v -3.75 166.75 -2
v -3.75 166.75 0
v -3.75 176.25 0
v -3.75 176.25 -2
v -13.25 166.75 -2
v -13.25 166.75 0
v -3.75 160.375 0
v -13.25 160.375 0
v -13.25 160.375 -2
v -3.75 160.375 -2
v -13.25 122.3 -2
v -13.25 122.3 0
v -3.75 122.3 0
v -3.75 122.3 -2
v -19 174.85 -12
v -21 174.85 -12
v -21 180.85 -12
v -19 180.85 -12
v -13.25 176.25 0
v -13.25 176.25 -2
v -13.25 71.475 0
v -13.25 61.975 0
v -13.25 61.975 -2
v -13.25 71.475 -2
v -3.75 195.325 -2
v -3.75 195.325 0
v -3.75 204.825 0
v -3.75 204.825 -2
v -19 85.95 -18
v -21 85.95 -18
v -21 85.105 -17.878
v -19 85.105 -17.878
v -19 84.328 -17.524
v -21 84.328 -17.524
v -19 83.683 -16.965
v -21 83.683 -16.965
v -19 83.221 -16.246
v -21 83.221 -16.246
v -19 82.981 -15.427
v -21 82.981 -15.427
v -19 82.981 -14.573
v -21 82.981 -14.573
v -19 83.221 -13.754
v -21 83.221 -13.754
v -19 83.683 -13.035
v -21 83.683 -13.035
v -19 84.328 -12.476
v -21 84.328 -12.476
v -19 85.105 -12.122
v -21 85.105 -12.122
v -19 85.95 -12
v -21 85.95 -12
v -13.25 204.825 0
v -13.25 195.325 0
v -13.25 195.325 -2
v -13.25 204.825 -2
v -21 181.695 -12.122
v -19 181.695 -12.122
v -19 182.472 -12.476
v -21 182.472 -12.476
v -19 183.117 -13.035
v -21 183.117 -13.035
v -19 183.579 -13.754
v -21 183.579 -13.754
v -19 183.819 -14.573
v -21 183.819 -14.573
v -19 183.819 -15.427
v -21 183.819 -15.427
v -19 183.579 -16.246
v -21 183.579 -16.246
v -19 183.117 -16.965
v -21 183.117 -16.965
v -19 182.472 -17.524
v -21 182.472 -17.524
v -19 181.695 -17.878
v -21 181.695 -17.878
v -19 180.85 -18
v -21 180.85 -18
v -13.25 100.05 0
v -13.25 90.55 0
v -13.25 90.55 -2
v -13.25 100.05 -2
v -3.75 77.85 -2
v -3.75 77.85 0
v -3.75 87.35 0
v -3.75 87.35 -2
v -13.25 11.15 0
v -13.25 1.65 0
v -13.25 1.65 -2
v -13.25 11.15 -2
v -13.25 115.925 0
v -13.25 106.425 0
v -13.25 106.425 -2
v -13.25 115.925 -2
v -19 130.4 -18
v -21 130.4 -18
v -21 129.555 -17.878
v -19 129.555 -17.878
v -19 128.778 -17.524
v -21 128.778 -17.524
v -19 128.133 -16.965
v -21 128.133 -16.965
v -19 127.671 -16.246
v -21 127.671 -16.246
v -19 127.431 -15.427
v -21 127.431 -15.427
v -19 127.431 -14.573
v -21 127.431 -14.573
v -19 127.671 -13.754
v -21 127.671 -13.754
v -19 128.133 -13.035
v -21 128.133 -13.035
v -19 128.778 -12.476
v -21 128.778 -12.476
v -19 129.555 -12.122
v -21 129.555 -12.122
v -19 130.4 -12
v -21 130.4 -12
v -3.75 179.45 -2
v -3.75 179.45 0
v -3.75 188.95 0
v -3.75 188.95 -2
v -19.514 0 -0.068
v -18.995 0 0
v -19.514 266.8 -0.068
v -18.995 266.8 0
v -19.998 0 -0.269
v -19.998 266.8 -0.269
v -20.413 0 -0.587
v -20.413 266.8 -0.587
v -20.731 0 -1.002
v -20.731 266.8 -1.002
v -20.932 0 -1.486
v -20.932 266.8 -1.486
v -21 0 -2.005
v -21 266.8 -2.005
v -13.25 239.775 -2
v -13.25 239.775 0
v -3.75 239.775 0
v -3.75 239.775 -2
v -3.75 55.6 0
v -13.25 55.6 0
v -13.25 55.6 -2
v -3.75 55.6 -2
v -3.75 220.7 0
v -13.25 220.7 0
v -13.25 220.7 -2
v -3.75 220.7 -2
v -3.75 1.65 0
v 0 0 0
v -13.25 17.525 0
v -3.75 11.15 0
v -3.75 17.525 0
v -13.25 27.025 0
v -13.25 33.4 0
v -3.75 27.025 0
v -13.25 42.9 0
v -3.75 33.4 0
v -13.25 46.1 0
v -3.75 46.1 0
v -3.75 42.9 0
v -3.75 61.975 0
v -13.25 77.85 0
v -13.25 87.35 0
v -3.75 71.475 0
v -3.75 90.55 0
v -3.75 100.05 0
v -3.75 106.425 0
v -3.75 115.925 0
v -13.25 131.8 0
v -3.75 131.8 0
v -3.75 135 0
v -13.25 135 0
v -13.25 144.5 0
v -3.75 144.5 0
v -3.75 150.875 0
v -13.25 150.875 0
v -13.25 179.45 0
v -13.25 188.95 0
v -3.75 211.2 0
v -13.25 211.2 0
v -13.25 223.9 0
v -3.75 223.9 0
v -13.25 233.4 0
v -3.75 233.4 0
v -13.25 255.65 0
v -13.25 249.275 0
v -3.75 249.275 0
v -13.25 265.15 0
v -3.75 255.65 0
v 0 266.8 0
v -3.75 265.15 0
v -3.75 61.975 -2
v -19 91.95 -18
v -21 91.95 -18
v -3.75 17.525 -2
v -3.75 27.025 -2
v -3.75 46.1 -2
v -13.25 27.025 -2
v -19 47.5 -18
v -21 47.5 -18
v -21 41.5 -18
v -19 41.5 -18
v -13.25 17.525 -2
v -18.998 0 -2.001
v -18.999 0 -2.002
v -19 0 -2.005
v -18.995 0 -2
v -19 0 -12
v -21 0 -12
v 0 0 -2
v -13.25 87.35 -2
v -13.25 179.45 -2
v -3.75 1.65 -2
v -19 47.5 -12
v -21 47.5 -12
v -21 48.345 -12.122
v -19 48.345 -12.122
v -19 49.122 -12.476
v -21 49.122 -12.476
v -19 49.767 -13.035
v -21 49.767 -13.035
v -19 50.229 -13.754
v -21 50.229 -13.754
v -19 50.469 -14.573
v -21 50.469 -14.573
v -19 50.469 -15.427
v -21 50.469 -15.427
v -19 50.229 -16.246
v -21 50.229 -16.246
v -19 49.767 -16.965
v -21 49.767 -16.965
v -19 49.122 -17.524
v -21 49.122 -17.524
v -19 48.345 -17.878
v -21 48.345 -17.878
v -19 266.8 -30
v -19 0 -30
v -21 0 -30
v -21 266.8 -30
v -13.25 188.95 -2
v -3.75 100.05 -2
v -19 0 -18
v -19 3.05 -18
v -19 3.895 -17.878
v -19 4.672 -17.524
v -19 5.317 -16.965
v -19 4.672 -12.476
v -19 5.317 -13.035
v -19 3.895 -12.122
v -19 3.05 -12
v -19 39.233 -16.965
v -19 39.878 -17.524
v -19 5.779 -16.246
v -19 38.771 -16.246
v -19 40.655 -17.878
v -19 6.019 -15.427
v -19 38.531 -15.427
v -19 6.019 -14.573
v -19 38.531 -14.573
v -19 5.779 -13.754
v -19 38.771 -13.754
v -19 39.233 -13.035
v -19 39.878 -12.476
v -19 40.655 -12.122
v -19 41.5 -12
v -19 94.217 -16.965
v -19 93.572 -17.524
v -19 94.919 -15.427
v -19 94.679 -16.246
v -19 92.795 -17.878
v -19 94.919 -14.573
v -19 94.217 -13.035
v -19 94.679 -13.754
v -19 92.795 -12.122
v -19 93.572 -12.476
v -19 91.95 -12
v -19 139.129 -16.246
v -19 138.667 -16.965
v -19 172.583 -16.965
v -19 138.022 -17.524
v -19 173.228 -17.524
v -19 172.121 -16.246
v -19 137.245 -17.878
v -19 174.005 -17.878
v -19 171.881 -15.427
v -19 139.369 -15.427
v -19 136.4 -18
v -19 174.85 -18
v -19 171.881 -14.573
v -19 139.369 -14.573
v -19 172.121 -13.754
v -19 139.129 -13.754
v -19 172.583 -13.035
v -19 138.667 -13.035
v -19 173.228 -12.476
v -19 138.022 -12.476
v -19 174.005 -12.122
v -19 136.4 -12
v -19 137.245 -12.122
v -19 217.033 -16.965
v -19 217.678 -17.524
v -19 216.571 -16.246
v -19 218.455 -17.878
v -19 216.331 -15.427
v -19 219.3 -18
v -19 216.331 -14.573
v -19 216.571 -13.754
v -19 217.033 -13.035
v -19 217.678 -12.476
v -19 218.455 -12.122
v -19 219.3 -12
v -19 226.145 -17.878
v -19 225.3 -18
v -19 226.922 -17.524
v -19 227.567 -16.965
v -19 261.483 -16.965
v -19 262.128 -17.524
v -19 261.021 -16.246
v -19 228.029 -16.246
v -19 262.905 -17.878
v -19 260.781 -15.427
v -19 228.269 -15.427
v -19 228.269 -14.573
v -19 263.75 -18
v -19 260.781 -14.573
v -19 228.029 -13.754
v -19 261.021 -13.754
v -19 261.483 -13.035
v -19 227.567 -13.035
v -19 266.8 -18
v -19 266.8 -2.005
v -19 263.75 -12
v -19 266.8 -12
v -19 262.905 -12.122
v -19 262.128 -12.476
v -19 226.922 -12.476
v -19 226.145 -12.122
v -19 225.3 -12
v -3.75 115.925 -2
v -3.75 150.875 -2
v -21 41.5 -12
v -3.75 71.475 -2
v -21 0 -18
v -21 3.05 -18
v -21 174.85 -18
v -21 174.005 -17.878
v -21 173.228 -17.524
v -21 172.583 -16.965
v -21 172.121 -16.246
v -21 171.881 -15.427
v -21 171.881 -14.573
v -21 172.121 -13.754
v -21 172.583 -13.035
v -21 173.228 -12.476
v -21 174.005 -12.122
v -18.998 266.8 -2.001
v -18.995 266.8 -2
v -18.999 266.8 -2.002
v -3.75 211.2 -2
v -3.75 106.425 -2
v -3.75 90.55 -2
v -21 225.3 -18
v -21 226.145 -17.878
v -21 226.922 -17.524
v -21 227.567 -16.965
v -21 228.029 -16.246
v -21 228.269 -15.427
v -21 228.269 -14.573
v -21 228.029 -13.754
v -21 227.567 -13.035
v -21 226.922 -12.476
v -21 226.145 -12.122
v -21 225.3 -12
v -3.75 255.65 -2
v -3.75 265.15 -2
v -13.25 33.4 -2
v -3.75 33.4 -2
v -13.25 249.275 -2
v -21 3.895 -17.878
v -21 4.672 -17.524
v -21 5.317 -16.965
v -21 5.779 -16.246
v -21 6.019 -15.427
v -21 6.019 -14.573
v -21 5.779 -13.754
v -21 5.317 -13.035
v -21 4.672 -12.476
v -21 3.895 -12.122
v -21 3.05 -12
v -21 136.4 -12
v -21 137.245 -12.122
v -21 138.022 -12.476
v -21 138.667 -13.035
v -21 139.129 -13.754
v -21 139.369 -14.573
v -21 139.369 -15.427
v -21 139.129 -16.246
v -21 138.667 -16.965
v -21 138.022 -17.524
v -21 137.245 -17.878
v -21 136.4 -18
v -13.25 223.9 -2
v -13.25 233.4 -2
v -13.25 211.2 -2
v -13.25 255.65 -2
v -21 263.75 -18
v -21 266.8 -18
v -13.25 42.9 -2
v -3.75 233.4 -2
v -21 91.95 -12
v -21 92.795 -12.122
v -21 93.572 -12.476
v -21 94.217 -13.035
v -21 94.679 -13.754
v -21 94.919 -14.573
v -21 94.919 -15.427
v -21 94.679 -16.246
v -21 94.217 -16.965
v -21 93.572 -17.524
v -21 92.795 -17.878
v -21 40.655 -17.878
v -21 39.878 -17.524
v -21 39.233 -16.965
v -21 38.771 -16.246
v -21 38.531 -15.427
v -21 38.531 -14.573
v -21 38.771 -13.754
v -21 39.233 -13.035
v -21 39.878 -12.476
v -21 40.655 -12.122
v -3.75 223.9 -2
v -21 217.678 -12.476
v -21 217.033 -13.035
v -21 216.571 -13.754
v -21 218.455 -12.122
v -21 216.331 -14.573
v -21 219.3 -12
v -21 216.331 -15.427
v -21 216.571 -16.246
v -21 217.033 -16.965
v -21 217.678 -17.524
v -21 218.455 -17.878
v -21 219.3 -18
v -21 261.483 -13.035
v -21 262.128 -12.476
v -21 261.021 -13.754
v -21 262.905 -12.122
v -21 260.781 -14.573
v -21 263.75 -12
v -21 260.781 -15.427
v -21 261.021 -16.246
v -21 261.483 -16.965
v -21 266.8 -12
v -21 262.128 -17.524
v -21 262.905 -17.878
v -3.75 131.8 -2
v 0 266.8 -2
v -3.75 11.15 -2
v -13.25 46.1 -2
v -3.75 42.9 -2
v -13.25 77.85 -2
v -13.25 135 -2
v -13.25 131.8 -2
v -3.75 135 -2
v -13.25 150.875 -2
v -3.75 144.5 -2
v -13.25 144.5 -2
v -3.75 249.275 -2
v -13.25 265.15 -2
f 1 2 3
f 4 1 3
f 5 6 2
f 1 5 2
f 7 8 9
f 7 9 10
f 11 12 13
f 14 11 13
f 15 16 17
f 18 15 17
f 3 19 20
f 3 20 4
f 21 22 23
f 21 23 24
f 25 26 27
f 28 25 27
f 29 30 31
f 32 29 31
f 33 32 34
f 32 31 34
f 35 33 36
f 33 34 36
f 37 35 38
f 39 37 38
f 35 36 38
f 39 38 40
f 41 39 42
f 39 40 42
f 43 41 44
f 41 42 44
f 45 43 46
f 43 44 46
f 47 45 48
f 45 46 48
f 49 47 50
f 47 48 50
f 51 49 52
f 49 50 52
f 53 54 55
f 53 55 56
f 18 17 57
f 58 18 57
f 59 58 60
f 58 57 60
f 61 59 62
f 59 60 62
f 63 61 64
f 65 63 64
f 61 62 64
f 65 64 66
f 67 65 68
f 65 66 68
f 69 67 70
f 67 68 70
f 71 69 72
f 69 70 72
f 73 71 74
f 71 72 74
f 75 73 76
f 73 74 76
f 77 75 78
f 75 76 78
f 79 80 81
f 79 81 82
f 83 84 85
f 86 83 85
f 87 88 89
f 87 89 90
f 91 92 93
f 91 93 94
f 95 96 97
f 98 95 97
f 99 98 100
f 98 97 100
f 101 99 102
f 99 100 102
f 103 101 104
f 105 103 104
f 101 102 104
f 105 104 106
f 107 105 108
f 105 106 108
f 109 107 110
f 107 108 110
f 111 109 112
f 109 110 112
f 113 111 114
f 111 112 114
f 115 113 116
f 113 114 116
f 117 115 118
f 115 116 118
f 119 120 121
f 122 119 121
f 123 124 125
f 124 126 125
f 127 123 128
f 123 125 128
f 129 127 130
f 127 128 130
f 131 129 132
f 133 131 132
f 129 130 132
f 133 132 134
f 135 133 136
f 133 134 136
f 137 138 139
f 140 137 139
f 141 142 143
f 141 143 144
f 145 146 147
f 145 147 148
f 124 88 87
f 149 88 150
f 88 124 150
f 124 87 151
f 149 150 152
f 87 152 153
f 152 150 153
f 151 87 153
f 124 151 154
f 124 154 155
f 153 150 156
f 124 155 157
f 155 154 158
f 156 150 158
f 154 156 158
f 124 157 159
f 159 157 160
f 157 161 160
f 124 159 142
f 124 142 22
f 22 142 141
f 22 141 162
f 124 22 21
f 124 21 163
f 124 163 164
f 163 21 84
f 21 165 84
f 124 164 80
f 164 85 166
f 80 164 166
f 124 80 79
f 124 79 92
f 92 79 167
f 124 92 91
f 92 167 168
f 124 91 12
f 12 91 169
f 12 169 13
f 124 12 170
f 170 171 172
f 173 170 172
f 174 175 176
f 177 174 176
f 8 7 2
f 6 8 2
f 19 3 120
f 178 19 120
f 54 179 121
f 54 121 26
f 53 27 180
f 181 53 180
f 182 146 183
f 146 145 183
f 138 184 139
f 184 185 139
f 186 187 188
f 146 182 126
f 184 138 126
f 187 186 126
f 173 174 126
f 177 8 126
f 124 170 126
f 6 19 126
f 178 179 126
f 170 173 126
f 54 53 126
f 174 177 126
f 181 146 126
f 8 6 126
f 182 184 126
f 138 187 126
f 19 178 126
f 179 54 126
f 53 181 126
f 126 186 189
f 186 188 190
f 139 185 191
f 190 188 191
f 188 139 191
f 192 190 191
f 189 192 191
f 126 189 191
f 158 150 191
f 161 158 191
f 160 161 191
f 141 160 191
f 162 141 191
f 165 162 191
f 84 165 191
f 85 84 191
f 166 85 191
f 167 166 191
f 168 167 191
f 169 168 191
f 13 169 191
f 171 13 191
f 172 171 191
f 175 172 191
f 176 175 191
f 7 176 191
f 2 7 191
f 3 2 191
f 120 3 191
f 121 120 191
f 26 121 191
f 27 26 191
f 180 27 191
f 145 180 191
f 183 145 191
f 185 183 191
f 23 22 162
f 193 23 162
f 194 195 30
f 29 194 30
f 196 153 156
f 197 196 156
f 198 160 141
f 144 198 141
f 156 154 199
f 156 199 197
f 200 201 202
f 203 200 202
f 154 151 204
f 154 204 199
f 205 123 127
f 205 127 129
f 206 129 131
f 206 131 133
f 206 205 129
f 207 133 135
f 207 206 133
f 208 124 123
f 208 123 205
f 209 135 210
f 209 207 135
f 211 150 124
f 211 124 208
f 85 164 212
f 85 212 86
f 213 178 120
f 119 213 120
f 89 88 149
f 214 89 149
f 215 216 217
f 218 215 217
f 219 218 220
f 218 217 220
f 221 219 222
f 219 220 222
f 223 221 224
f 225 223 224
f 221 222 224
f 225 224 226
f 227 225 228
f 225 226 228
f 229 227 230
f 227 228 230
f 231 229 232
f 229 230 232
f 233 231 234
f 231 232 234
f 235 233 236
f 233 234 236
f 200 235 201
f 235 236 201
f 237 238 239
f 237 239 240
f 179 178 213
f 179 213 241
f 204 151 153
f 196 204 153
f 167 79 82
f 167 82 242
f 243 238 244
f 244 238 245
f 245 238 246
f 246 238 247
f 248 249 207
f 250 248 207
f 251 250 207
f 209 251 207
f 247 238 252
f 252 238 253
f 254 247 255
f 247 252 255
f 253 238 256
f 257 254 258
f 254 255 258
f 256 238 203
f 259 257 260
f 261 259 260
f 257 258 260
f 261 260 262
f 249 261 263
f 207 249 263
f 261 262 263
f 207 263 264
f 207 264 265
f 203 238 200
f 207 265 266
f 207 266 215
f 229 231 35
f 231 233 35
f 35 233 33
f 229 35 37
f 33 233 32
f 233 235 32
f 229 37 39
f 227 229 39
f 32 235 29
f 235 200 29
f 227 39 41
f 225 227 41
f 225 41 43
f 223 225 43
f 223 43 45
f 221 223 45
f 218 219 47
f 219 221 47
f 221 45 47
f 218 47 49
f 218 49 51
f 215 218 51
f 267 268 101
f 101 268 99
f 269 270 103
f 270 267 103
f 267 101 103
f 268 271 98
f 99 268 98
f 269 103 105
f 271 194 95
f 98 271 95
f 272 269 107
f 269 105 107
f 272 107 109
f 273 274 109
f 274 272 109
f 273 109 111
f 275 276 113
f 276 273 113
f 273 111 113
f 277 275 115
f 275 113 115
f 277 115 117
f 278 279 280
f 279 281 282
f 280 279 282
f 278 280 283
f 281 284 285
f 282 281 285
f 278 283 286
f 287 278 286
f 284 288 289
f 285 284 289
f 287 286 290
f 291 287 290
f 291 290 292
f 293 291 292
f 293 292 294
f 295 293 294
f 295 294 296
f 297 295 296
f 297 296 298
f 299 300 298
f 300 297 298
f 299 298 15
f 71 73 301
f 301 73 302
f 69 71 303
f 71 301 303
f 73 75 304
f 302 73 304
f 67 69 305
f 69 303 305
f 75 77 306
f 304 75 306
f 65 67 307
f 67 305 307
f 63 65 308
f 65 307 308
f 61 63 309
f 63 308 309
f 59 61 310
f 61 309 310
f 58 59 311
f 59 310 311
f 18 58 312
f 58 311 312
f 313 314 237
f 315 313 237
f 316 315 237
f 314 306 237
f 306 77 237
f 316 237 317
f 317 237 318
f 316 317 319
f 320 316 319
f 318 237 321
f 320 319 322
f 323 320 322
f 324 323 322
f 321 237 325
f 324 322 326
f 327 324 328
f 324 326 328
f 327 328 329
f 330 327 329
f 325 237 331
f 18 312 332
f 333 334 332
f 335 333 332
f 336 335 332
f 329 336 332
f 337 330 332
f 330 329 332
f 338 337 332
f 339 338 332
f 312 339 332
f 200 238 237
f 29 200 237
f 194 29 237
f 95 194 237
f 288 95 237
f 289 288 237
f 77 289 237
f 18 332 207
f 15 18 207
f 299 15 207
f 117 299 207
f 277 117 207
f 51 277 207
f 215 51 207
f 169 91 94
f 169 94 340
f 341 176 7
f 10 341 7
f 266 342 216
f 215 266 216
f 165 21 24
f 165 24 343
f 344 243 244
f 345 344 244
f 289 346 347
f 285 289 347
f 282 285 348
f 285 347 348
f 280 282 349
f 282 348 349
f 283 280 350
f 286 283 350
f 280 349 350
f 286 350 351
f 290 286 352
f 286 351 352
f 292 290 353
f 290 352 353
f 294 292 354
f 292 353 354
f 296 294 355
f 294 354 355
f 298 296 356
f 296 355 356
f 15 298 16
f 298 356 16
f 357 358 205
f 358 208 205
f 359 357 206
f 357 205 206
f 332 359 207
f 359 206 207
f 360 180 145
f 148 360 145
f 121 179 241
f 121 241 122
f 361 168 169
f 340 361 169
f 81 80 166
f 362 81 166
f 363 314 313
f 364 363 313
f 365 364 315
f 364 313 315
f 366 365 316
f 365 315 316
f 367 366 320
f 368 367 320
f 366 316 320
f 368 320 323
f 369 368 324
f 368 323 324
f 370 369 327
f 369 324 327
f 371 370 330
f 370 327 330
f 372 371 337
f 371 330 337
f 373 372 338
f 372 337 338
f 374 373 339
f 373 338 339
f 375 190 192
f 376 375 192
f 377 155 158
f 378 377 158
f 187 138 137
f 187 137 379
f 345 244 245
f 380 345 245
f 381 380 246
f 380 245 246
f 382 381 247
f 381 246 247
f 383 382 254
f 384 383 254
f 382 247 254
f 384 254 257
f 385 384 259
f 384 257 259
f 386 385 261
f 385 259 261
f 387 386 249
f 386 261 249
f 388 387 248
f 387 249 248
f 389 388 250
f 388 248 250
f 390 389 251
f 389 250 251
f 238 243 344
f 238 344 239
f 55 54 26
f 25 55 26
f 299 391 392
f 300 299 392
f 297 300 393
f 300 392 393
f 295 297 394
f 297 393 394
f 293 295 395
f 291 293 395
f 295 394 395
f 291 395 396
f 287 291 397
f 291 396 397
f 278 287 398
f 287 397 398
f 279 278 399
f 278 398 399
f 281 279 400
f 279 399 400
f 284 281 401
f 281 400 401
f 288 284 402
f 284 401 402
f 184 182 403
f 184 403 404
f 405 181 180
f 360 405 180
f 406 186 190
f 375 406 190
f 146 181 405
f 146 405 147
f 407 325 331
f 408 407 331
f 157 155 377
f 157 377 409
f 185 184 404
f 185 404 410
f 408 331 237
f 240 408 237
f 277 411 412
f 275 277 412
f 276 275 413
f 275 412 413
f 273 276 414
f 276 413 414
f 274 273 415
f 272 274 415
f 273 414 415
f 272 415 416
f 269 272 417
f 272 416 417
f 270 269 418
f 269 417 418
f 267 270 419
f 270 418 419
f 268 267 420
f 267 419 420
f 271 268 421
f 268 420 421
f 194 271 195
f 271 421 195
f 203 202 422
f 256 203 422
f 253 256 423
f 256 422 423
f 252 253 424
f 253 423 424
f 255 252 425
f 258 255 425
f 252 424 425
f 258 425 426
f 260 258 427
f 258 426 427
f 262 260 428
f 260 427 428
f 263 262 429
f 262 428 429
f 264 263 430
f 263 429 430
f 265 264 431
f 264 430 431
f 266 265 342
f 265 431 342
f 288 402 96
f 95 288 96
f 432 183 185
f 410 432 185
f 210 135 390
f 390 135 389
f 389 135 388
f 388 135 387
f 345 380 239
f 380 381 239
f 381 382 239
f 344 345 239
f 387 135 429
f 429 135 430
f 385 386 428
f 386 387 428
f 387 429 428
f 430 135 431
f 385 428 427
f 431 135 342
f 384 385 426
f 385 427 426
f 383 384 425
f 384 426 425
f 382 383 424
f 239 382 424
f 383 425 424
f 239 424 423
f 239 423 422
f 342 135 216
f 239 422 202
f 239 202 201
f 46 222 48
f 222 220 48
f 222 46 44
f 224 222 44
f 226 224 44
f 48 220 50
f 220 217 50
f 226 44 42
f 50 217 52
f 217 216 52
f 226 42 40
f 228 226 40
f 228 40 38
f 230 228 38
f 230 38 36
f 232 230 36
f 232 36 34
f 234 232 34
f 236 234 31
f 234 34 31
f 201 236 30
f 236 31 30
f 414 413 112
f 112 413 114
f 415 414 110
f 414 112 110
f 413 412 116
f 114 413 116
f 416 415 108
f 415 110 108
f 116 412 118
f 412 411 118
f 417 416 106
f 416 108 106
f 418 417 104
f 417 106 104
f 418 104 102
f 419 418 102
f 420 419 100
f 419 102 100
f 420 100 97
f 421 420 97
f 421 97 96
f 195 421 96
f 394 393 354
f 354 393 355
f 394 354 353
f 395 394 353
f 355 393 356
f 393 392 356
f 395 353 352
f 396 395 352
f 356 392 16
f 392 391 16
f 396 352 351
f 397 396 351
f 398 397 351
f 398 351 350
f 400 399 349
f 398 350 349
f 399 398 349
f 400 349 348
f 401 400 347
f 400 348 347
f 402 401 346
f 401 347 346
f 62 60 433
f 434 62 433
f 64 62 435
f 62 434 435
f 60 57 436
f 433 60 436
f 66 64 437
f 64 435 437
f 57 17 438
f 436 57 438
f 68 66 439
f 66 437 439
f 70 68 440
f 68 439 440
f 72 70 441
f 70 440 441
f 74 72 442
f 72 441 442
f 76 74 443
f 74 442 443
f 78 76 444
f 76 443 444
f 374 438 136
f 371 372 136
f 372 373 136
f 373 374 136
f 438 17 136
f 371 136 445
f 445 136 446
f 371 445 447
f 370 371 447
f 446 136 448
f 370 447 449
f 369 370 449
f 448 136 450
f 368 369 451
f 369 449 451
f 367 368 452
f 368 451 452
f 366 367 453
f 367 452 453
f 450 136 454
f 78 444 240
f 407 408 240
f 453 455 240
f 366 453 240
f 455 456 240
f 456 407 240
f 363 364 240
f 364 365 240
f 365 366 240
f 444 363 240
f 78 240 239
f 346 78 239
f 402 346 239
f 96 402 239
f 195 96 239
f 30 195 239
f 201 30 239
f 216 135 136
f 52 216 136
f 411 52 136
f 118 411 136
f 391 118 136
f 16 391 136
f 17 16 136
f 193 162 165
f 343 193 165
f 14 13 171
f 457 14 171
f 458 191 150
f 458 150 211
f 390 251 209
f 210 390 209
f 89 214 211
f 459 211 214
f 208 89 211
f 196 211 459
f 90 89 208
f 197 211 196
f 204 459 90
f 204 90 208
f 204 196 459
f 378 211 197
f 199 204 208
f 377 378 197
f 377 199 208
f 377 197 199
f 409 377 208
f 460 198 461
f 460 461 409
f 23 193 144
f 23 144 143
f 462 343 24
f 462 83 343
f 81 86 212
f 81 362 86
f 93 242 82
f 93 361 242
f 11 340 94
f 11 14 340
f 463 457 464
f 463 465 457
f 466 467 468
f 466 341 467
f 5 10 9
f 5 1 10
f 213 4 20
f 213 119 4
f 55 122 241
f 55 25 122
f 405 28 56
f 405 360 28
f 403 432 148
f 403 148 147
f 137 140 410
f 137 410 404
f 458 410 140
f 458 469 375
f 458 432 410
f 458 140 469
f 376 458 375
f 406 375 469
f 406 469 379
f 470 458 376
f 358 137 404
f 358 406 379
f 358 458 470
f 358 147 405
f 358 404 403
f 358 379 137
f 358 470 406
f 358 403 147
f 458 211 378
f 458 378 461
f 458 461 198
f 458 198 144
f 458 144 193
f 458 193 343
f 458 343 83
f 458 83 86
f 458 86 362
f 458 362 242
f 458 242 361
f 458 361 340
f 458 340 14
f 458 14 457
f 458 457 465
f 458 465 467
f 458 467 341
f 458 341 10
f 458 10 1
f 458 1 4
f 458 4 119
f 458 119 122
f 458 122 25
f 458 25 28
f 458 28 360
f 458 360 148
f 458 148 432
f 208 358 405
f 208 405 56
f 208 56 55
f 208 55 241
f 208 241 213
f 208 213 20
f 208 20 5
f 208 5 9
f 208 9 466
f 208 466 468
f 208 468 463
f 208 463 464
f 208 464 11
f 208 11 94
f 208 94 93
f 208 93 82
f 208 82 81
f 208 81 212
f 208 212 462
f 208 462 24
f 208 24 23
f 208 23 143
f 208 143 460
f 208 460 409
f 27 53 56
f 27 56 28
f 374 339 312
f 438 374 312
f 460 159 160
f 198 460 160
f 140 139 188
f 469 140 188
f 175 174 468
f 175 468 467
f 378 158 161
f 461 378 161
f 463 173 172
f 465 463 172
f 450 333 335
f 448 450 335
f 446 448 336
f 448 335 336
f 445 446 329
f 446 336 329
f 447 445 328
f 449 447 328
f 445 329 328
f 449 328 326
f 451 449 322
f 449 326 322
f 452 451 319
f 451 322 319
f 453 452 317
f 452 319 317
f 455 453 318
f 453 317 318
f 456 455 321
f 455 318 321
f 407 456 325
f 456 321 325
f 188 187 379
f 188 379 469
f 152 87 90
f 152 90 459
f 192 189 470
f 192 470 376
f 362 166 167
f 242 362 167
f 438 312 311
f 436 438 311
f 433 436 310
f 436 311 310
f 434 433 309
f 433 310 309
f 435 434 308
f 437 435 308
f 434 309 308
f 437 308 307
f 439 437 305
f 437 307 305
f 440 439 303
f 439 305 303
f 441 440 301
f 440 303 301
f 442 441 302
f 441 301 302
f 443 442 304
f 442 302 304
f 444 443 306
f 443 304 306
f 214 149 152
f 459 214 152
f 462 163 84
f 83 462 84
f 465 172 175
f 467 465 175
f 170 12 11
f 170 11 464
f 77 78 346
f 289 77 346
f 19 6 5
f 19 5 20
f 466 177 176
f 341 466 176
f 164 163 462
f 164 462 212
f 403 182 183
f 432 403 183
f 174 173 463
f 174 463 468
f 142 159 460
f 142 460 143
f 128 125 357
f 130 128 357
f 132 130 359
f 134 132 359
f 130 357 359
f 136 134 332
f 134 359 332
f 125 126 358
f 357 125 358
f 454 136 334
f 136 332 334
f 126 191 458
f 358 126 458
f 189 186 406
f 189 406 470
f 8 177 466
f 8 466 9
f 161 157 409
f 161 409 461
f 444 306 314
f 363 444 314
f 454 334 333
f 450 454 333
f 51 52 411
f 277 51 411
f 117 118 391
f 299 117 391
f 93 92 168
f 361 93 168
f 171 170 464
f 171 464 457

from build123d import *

# Parameters (mm, degrees)
SKETCH1_W           = 30
SKETCH1_H           = 266.8
BOSS_EXTRUDE1_DEPTH = 21
SKETCH2_W           = 19
SKETCH2_H           = 28
CUT_EXTRUDE1_DEPTH  = 270.301392495
CUT_EXTRUDE2_DEPTH  = 270.152819045
CUT_EXTRUDE3_DEPTH  = 270.152819045
CUT_EXTRUDE4_DEPTH  = 270.301392495
CUT_EXTRUDE5_DEPTH  = 270.301392495
CUT_EXTRUDE6_DEPTH  = 270.301392495
CUT_EXTRUDE7_DEPTH  = 270.301392495
SKETCH9_W           = 9.5
SKETCH9_H           = 9.5
CUT_EXTRUDE8_DEPTH  = 270.301392495
SKETCH10_W          = 9.5
SKETCH10_H          = 9.5
CUT_EXTRUDE9_DEPTH  = 270.301392495
SKETCH11_W          = 9.5
SKETCH11_H          = 9.5
CUT_EXTRUDE10_DEPTH = 270.301392495
SKETCH12_W          = 9.5
SKETCH12_H          = 9.5
CUT_EXTRUDE11_DEPTH = 270.301392495
SKETCH13_W          = 9.5
SKETCH13_H          = 9.5
CUT_EXTRUDE12_DEPTH = 270.301392495
SKETCH14_W          = 9.5
SKETCH14_H          = 9.5
CUT_EXTRUDE13_DEPTH = 270.301392495
SKETCH15_W          = 9.5
SKETCH15_H          = 9.5
CUT_EXTRUDE14_DEPTH = 270.301392495
SKETCH16_W          = 9.5
SKETCH16_H          = 9.5
CUT_EXTRUDE15_DEPTH = 270.301392495
SKETCH17_W          = 9.5
SKETCH17_H          = 9.5
CUT_EXTRUDE16_DEPTH = 270.301392495
SKETCH18_W          = 9.5
SKETCH18_H          = 9.5
CUT_EXTRUDE17_DEPTH = 270.301392495
SKETCH19_W          = 9.5
SKETCH19_H          = 9.5
CUT_EXTRUDE18_DEPTH = 270.301392495
SKETCH20_W          = 9.5
SKETCH20_H          = 9.5
CUT_EXTRUDE19_DEPTH = 270.301392495
SKETCH21_W          = 9.5
SKETCH21_H          = 9.5
CUT_EXTRUDE20_DEPTH = 270.301392495
SKETCH22_W          = 9.5
SKETCH22_H          = 9.5
CUT_EXTRUDE21_DEPTH = 270.301392495
SKETCH23_W          = 9.5
SKETCH23_H          = 9.5
CUT_EXTRUDE22_DEPTH = 270.301392495
SKETCH24_W          = 9.5
SKETCH24_H          = 9.5
CUT_EXTRUDE23_DEPTH = 270.301392495
SKETCH25_W          = 9.5
SKETCH25_H          = 9.5
CUT_EXTRUDE24_DEPTH = 270.301392495
SKETCH26_W          = 9.5
SKETCH26_H          = 9.5
CUT_EXTRUDE25_DEPTH = 270.301392495
CUT_EXTRUDE26_DEPTH = 270.152819045
FILLET1_R           = 0.005
FILLET2_R           = 2.005


with BuildPart() as part:
    # Sketch1 → Boss-Extrude1 (new body)
    with BuildSketch(Plane(origin=(0, 0, 0), x_dir=(0, 0, -1), z_dir=(1, 0, 0))):
        with Locations((15, 133.4)):
            Rectangle(SKETCH1_W, SKETCH1_H)
    extrude(amount=-BOSS_EXTRUDE1_DEPTH)

    # Sketch2 → Cut-Extrude1 (cut, through all)
    with BuildSketch(Plane(origin=(0, 266.8, 0), x_dir=(-1, 0, 0), z_dir=(0, 1, 0))):
        with Locations((9.5, -16)):
            Rectangle(SKETCH2_W, SKETCH2_H)
    extrude(amount=-CUT_EXTRUDE1_DEPTH, mode=Mode.SUBTRACT)

    # Sketch3 → Cut-Extrude2 (cut, through all)
    with BuildSketch(Plane(origin=(-19, 0, 0), x_dir=(0, 0, -1), z_dir=(1, 0, 0))):
        with BuildLine():
            Line((12, 266.8), (12, 263.75))
            ThreePointArc((12, 263.75), (15, 260.75), (18, 263.75))
            Line((18, 263.75), (18, 266.8))
            Line((18, 266.8), (12, 266.8))
        make_face()
    extrude(amount=-CUT_EXTRUDE2_DEPTH, mode=Mode.SUBTRACT)

    # Sketch4 → Cut-Extrude3 (cut, through all)
    with BuildSketch(Plane(origin=(-19, 0, 0), x_dir=(0, 0, -1), z_dir=(1, 0, 0))):
        with BuildLine():
            Line((18, 0), (18, 3.05))
            ThreePointArc((18, 3.05), (15, 6.05), (12, 3.05))
            Line((12, 3.05), (12, 0))
            Line((12, 0), (18, 0))
        make_face()
    extrude(amount=-CUT_EXTRUDE3_DEPTH, mode=Mode.SUBTRACT)

    # Sketch5 → Cut-Extrude4 (cut, through all)
    with BuildSketch(Plane.ZY.offset(21)):
        with BuildLine():
            Line((-12, 41.5), (-12, 47.5))
            ThreePointArc((-12, 47.5), (-15, 50.5), (-18, 47.5))
            Line((-18, 47.5), (-18, 41.5))
            ThreePointArc((-18, 41.5), (-15, 38.5), (-12, 41.5))
        make_face()
    extrude(amount=-CUT_EXTRUDE4_DEPTH, mode=Mode.SUBTRACT)

    # Sketch6 → Cut-Extrude5 (cut, through all)
    with BuildSketch(Plane.ZY.offset(21)):
        with BuildLine():
            Line((-12, 85.95), (-12, 91.95))
            ThreePointArc((-12, 91.95), (-15, 94.95), (-18, 91.95))
            Line((-18, 91.95), (-18, 85.95))
            ThreePointArc((-18, 85.95), (-15, 82.95), (-12, 85.95))
        make_face()
    extrude(amount=-CUT_EXTRUDE5_DEPTH, mode=Mode.SUBTRACT)

    # Sketch7 → Cut-Extrude6 (cut, through all)
    with BuildSketch(Plane.ZY.offset(21)):
        with BuildLine():
            Line((-12, 130.4), (-12, 136.4))
            ThreePointArc((-12, 136.4), (-15, 139.4), (-18, 136.4))
            Line((-18, 136.4), (-18, 130.4))
            ThreePointArc((-18, 130.4), (-15, 127.4), (-12, 130.4))
        make_face()
    extrude(amount=-CUT_EXTRUDE6_DEPTH, mode=Mode.SUBTRACT)

    # Sketch8 → Cut-Extrude7 (cut, through all)
    with BuildSketch(Plane.ZY.offset(21)):
        with BuildLine():
            Line((-12, 174.85), (-12, 180.85))
            ThreePointArc((-12, 180.85), (-15, 183.85), (-18, 180.85))
            Line((-18, 180.85), (-18, 174.85))
            ThreePointArc((-18, 174.85), (-15, 171.85), (-12, 174.85))
        make_face()
    extrude(amount=-CUT_EXTRUDE7_DEPTH, mode=Mode.SUBTRACT)

    # Sketch9 → Cut-Extrude8 (cut, through all)
    with BuildSketch(Plane.XY):
        with Locations((-8.5, 244.525)):
            Rectangle(SKETCH9_W, SKETCH9_H)
    extrude(amount=-CUT_EXTRUDE8_DEPTH, mode=Mode.SUBTRACT)

    # Sketch10 → Cut-Extrude9 (cut, through all)
    with BuildSketch(Plane.XY):
        with Locations((-8.5, 228.65)):
            Rectangle(SKETCH10_W, SKETCH10_H)
    extrude(amount=-CUT_EXTRUDE9_DEPTH, mode=Mode.SUBTRACT)

    # Sketch11 → Cut-Extrude10 (cut, through all)
    with BuildSketch(Plane.XY):
        with Locations((-8.5, 215.95)):
            Rectangle(SKETCH11_W, SKETCH11_H)
    extrude(amount=-CUT_EXTRUDE10_DEPTH, mode=Mode.SUBTRACT)

    # Sketch12 → Cut-Extrude11 (cut, through all)
    with BuildSketch(Plane.XY):
        with Locations((-8.5, 200.075)):
            Rectangle(SKETCH12_W, SKETCH12_H)
    extrude(amount=-CUT_EXTRUDE11_DEPTH, mode=Mode.SUBTRACT)

    # Sketch13 → Cut-Extrude12 (cut, through all)
    with BuildSketch(Plane.XY):
        with Locations((-8.5, 184.2)):
            Rectangle(SKETCH13_W, SKETCH13_H)
    extrude(amount=-CUT_EXTRUDE12_DEPTH, mode=Mode.SUBTRACT)

    # Sketch14 → Cut-Extrude13 (cut, through all)
    with BuildSketch(Plane.XY):
        with Locations((-8.5, 171.5)):
            Rectangle(SKETCH14_W, SKETCH14_H)
    extrude(amount=-CUT_EXTRUDE13_DEPTH, mode=Mode.SUBTRACT)

    # Sketch15 → Cut-Extrude14 (cut, through all)
    with BuildSketch(Plane.XY):
        with Locations((-8.5, 155.625)):
            Rectangle(SKETCH15_W, SKETCH15_H)
    extrude(amount=-CUT_EXTRUDE14_DEPTH, mode=Mode.SUBTRACT)

    # Sketch16 → Cut-Extrude15 (cut, through all)
    with BuildSketch(Plane.XY):
        with Locations((-8.5, 139.75)):
            Rectangle(SKETCH16_W, SKETCH16_H)
    extrude(amount=-CUT_EXTRUDE15_DEPTH, mode=Mode.SUBTRACT)

    # Sketch17 → Cut-Extrude16 (cut, through all)
    with BuildSketch(Plane.XY):
        with Locations((-8.5, 127.05)):
            Rectangle(SKETCH17_W, SKETCH17_H)
    extrude(amount=-CUT_EXTRUDE16_DEPTH, mode=Mode.SUBTRACT)

    # Sketch18 → Cut-Extrude17 (cut, through all)
    with BuildSketch(Plane.XY):
        with Locations((-8.5, 111.175)):
            Rectangle(SKETCH18_W, SKETCH18_H)
    extrude(amount=-CUT_EXTRUDE17_DEPTH, mode=Mode.SUBTRACT)

    # Sketch19 → Cut-Extrude18 (cut, through all)
    with BuildSketch(Plane.XY):
        with Locations((-8.5, 95.3)):
            Rectangle(SKETCH19_W, SKETCH19_H)
    extrude(amount=-CUT_EXTRUDE18_DEPTH, mode=Mode.SUBTRACT)

    # Sketch20 → Cut-Extrude19 (cut, through all)
    with BuildSketch(Plane.XY):
        with Locations((-8.5, 82.6)):
            Rectangle(SKETCH20_W, SKETCH20_H)
    extrude(amount=-CUT_EXTRUDE19_DEPTH, mode=Mode.SUBTRACT)

    # Sketch21 → Cut-Extrude20 (cut, through all)
    with BuildSketch(Plane.XY):
        with Locations((-8.5, 66.725)):
            Rectangle(SKETCH21_W, SKETCH21_H)
    extrude(amount=-CUT_EXTRUDE20_DEPTH, mode=Mode.SUBTRACT)

    # Sketch22 → Cut-Extrude21 (cut, through all)
    with BuildSketch(Plane.XY):
        with Locations((-8.5, 50.85)):
            Rectangle(SKETCH22_W, SKETCH22_H)
    extrude(amount=-CUT_EXTRUDE21_DEPTH, mode=Mode.SUBTRACT)

    # Sketch23 → Cut-Extrude22 (cut, through all)
    with BuildSketch(Plane.XY):
        with Locations((-8.5, 38.15)):
            Rectangle(SKETCH23_W, SKETCH23_H)
    extrude(amount=-CUT_EXTRUDE22_DEPTH, mode=Mode.SUBTRACT)

    # Sketch24 → Cut-Extrude23 (cut, through all)
    with BuildSketch(Plane.XY):
        with Locations((-8.5, 22.275)):
            Rectangle(SKETCH24_W, SKETCH24_H)
    extrude(amount=-CUT_EXTRUDE23_DEPTH, mode=Mode.SUBTRACT)

    # Sketch25 → Cut-Extrude24 (cut, through all)
    with BuildSketch(Plane.XY):
        with Locations((-8.5, 6.4)):
            Rectangle(SKETCH25_W, SKETCH25_H)
    extrude(amount=-CUT_EXTRUDE24_DEPTH, mode=Mode.SUBTRACT)

    # Sketch26 → Cut-Extrude25 (cut, through all)
    with BuildSketch(Plane.XY):
        with Locations((-8.5, 260.4)):
            Rectangle(SKETCH26_W, SKETCH26_H)
    extrude(amount=-CUT_EXTRUDE25_DEPTH, mode=Mode.SUBTRACT)

    # Sketch27 → Cut-Extrude26 (cut, through all)
    with BuildSketch(Plane(origin=(-19, 0, 0), x_dir=(0, 0, -1), z_dir=(1, 0, 0))):
        with BuildLine():
            Line((12, 225.3), (12, 219.3))
            ThreePointArc((12, 219.3), (15, 216.3), (18, 219.3))
            Line((18, 219.3), (18, 225.3))
            ThreePointArc((18, 225.3), (15, 228.3), (12, 225.3))
        make_face()
    extrude(amount=-CUT_EXTRUDE26_DEPTH, mode=Mode.SUBTRACT)

    # Fillet1
    fillet1_edges = [part.edges().sort_by_distance(p)[0] for p in [
        (-19, 133.4, -2),
    ]]
    fillet(fillet1_edges, radius=FILLET1_R)

    # Fillet2
    fillet2_edges = [part.edges().sort_by_distance(p)[0] for p in [
        (-21, 133.4, 0),
    ]]
    fillet(fillet2_edges, radius=FILLET2_R)


solid = part.part
